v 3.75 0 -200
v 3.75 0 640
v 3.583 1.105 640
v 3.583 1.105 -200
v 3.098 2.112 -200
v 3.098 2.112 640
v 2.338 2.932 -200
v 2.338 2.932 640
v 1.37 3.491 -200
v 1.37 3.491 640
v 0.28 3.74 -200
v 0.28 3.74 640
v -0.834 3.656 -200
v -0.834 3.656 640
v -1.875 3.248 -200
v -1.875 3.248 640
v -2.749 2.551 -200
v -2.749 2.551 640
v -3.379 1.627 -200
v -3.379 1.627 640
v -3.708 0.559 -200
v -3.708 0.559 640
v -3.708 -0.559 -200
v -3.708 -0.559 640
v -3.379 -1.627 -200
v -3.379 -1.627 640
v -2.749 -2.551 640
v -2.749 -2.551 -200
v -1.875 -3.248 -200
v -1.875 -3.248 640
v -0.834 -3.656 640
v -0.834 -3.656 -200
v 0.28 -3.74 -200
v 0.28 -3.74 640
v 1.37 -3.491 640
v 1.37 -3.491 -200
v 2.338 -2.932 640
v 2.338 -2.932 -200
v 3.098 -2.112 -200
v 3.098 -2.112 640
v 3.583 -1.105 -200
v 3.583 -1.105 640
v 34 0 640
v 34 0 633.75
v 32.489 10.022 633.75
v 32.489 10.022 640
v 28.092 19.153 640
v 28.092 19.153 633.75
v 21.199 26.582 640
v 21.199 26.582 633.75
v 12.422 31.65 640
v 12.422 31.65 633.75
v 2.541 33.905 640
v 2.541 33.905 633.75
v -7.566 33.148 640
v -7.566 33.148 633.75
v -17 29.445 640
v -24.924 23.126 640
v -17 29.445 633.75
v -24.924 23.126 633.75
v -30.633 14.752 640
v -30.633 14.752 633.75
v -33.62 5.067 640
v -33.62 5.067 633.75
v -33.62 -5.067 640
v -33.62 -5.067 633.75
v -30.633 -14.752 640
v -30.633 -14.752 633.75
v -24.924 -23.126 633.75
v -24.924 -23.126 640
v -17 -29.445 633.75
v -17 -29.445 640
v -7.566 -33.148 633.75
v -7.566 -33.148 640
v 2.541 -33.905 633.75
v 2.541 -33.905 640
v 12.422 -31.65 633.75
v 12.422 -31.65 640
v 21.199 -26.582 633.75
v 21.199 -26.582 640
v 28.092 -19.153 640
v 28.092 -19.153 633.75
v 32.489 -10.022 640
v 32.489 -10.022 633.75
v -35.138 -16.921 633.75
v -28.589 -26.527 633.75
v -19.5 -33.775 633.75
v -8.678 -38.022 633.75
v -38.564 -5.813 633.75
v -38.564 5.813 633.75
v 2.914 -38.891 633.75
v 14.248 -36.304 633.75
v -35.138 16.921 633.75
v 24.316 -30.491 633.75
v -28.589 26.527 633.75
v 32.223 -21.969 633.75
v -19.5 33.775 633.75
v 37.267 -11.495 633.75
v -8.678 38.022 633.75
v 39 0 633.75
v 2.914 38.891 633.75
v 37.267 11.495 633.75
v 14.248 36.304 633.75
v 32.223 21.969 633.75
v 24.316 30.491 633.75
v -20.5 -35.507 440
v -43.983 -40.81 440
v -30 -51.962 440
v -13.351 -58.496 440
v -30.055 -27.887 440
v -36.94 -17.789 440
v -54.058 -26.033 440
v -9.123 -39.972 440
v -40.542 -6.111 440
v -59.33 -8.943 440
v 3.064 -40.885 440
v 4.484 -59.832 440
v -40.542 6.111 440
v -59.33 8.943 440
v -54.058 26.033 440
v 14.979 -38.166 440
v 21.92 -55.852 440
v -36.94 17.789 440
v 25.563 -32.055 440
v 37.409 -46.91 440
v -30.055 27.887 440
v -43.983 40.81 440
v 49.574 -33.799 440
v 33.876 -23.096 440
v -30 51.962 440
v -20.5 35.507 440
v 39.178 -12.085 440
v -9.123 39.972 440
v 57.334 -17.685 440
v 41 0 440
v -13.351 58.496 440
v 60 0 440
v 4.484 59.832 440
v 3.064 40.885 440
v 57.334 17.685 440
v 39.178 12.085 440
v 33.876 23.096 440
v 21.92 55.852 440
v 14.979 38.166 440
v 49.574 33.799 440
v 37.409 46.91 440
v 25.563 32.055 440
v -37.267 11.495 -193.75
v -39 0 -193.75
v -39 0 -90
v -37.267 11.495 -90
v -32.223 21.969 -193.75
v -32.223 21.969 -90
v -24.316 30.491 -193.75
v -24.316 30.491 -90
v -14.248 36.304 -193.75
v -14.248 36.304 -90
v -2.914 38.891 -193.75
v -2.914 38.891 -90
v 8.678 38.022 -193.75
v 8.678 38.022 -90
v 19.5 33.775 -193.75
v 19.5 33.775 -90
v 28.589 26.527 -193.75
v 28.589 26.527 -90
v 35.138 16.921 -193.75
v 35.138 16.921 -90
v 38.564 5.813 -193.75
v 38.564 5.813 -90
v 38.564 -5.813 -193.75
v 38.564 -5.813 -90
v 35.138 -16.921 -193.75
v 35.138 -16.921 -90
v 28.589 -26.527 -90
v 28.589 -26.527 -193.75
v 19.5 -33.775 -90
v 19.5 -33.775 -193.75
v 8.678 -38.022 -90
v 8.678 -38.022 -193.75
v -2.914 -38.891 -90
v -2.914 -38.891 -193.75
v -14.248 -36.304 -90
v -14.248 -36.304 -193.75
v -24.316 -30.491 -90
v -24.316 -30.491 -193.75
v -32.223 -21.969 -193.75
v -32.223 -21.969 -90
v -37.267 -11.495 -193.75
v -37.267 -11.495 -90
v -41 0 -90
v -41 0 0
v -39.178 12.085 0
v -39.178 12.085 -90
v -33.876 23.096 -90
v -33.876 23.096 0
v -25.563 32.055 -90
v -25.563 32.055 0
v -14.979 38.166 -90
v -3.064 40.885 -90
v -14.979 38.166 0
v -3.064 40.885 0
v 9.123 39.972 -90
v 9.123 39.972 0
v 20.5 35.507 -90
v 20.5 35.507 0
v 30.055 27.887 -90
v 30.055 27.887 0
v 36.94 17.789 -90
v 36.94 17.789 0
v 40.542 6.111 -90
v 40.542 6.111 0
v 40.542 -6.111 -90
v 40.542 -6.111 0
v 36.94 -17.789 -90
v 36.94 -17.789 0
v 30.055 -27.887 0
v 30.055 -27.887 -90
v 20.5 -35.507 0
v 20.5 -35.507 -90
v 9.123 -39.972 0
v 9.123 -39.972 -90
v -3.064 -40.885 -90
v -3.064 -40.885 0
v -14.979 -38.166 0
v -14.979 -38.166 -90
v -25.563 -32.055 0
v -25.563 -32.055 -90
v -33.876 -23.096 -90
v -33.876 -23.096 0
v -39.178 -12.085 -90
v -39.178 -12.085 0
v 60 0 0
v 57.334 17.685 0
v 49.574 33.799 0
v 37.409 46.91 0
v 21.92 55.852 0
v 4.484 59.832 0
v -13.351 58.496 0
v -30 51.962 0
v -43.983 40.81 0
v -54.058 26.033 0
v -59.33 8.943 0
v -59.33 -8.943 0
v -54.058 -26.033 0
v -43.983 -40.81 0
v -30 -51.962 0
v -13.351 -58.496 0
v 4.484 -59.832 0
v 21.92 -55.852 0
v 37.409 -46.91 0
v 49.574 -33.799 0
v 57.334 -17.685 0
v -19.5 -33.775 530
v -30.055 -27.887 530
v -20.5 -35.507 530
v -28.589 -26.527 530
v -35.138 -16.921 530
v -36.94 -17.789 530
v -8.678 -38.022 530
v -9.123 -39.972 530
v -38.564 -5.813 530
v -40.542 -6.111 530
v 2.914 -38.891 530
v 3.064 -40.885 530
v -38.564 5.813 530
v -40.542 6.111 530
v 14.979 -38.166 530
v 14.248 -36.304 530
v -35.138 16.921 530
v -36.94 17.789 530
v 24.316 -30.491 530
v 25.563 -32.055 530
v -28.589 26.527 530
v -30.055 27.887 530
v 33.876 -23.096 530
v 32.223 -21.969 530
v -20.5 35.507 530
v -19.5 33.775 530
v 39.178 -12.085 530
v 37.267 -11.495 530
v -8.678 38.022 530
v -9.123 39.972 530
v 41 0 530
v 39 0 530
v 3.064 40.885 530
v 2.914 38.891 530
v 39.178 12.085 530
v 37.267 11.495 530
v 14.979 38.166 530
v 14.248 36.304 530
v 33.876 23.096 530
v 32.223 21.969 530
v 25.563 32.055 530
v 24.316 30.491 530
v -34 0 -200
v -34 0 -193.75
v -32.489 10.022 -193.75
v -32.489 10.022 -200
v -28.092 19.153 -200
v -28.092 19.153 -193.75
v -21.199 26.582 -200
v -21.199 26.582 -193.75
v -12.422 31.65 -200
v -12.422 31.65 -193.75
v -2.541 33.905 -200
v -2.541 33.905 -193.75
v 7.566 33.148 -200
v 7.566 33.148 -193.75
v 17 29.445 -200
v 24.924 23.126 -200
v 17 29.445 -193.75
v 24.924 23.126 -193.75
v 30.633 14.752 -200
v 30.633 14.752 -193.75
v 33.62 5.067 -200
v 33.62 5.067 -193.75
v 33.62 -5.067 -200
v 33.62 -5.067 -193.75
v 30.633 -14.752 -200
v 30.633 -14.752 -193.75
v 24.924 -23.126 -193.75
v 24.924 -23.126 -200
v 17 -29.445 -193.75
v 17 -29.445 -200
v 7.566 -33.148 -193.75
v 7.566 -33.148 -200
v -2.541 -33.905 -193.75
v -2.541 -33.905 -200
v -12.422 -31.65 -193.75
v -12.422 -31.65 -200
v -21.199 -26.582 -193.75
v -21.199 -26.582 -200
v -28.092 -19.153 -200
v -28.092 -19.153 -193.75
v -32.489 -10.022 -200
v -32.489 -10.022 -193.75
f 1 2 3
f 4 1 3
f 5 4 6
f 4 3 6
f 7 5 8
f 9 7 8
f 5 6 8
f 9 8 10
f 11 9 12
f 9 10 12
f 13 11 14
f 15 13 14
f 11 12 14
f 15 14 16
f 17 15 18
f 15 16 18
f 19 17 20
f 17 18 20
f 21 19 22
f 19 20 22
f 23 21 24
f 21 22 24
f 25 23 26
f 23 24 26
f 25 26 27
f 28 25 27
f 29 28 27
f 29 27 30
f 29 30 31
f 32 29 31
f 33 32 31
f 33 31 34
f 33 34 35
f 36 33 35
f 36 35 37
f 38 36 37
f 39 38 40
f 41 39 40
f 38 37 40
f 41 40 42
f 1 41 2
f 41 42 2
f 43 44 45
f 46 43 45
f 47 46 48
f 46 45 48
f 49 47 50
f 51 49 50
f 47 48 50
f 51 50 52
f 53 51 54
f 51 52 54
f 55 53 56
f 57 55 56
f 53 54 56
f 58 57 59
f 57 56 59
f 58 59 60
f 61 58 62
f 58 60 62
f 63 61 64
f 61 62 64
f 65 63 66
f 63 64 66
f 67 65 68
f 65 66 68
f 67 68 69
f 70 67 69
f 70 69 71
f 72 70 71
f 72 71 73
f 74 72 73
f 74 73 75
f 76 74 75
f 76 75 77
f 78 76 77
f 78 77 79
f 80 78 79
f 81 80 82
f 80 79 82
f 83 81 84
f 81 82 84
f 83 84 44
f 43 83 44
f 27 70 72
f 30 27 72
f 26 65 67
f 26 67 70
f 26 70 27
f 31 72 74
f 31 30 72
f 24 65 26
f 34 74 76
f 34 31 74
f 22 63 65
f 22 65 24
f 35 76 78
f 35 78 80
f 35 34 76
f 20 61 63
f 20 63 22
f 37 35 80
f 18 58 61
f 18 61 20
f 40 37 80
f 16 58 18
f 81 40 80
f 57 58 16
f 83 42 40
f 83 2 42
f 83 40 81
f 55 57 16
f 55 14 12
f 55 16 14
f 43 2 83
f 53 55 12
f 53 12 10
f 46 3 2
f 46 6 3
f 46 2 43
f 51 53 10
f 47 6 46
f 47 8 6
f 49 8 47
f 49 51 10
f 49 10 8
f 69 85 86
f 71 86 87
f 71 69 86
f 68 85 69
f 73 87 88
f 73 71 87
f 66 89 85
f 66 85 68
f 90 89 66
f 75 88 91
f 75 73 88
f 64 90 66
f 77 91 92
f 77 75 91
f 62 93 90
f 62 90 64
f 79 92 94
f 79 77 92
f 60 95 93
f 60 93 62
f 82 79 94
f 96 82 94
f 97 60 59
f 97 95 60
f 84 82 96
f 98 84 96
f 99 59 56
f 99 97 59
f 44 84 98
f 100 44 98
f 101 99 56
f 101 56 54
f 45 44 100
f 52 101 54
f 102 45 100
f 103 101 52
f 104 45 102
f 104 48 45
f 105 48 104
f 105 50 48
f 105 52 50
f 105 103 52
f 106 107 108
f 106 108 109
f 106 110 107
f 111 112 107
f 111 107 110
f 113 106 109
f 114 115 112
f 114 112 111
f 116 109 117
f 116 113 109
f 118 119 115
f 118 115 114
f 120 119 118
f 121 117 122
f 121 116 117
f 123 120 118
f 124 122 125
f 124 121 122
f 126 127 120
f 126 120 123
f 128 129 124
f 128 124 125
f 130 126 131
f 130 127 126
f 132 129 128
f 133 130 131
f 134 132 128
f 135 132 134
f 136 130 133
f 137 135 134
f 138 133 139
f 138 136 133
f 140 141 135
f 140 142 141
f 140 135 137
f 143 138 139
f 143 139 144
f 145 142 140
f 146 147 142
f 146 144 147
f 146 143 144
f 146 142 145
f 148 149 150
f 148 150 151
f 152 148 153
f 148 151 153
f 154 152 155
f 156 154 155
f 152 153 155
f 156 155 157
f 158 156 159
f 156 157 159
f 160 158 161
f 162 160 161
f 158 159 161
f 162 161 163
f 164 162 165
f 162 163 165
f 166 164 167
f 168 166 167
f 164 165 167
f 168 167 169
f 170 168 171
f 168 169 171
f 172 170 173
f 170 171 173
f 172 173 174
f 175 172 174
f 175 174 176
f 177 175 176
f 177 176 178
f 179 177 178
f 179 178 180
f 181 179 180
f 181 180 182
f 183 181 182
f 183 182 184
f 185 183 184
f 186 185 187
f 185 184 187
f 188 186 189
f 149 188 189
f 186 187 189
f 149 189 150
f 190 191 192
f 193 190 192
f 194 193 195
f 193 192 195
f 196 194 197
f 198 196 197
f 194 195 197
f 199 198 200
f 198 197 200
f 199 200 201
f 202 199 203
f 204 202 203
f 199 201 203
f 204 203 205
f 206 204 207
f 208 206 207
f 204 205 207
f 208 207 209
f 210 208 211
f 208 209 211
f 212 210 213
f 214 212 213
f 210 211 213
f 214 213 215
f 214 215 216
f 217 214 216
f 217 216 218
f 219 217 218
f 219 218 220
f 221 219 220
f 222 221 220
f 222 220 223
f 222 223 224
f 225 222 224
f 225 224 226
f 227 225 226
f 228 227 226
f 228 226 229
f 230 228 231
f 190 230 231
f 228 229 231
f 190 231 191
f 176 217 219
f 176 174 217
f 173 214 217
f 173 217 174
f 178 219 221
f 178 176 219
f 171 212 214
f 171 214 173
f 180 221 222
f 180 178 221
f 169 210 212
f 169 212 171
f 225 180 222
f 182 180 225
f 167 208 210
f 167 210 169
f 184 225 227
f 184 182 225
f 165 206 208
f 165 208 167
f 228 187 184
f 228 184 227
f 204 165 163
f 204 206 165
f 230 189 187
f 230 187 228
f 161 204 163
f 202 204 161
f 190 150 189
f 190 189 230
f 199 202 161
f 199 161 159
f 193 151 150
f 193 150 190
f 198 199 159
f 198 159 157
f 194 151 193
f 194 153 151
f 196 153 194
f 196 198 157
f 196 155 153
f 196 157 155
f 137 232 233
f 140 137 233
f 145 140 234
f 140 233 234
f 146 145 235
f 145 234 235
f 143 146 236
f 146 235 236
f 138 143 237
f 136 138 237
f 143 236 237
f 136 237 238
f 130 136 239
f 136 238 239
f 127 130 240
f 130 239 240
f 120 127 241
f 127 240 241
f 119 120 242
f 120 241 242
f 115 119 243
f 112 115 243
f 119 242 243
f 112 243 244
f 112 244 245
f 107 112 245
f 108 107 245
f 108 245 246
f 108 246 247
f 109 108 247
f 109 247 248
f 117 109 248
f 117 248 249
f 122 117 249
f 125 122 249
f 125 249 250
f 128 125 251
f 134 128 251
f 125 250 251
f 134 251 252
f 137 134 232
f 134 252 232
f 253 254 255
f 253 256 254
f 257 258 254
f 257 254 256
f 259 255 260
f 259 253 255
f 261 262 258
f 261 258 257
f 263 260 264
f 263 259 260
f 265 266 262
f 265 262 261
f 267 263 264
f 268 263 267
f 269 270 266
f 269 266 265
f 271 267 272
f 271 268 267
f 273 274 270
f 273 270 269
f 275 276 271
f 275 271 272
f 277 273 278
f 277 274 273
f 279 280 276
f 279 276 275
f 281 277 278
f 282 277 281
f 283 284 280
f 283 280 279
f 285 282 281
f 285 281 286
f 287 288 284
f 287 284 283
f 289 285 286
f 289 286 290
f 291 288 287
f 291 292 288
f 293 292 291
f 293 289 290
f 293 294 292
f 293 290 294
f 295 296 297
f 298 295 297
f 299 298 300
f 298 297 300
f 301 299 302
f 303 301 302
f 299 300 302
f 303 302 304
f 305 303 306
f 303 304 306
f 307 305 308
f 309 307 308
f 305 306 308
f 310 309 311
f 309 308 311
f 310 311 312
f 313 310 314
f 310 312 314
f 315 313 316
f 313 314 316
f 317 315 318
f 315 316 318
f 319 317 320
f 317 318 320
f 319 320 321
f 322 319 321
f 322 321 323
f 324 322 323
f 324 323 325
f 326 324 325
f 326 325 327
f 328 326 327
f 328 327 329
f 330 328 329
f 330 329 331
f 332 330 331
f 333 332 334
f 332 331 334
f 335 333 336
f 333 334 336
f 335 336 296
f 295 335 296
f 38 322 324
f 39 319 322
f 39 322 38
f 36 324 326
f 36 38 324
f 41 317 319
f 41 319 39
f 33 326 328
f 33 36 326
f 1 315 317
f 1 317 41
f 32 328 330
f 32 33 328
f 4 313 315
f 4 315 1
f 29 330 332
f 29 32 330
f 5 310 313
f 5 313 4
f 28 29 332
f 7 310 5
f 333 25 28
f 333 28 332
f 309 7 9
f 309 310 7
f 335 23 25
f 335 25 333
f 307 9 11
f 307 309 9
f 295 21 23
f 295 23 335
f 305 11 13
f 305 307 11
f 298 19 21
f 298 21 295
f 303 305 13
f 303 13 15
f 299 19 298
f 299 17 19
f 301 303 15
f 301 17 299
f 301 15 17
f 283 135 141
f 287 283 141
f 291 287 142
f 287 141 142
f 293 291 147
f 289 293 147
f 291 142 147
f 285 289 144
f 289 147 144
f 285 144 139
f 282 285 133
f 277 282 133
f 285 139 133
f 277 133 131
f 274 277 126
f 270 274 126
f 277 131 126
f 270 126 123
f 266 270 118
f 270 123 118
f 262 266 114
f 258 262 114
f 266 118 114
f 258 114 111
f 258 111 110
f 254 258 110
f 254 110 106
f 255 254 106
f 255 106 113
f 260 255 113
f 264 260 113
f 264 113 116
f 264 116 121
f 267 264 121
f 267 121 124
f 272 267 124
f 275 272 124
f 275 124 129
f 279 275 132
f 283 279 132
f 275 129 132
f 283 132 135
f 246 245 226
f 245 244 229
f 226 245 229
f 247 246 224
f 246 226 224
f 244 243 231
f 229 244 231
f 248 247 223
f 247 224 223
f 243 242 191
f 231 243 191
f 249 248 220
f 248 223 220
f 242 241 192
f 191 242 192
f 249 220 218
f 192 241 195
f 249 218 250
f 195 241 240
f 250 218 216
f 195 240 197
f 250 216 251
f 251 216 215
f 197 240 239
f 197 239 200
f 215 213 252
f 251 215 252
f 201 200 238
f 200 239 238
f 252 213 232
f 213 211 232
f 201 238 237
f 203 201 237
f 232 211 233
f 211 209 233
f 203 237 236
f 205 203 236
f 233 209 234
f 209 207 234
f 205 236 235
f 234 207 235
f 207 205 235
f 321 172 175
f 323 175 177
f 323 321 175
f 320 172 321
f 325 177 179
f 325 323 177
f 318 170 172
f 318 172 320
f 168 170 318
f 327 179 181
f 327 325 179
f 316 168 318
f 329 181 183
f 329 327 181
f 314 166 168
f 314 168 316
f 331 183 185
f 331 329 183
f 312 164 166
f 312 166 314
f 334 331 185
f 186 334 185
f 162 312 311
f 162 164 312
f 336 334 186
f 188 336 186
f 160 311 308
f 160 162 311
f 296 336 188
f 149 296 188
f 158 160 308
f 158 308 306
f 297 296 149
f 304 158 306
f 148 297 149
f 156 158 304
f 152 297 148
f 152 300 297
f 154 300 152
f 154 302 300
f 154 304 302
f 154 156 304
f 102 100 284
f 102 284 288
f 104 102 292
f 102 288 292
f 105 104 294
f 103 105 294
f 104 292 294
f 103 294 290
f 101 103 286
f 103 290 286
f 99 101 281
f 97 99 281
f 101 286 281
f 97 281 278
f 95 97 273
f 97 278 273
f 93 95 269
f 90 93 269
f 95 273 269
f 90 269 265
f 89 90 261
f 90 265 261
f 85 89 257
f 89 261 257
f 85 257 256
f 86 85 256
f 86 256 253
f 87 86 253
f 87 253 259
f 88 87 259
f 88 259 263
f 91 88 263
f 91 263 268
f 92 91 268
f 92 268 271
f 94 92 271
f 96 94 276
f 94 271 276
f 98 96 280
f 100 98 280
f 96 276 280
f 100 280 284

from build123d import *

# Parameters (mm, degrees)
SKETCH1_R           = 60
BOSS_EXTRUDE1_DEPTH = 440
SKETCH2_R           = 41
BOSS_EXTRUDE2_DEPTH = 90
SKETCH3_R           = 41
BOSS_EXTRUDE3_DEPTH = 90
SKETCH4_R           = 39
BOSS_EXTRUDE4_DEPTH = 103.75
SKETCH5_R           = 39
BOSS_EXTRUDE5_DEPTH = 103.75
SKETCH6_R           = 34
BOSS_EXTRUDE6_DEPTH = 6.25
SKETCH7_R           = 34
BOSS_EXTRUDE7_DEPTH = 6.25
SKETCH8_R           = 3.75
CUT_EXTRUDE1_DEPTH  = 840


with BuildPart() as part:
    # Sketch1 → Boss-Extrude1 (new body)
    with BuildSketch(Plane.XY):
        Circle(SKETCH1_R)
    extrude(amount=BOSS_EXTRUDE1_DEPTH)

    # Sketch2 → Boss-Extrude2 (add)
    with BuildSketch(Plane(origin=(0, 0, 0), x_dir=(-1, 0, 0), z_dir=(0, 0, -1))):
        Circle(SKETCH2_R)
    extrude(amount=BOSS_EXTRUDE2_DEPTH)

    # Sketch3 → Boss-Extrude3 (add)
    with BuildSketch(Plane.XY.offset(440)):
        Circle(SKETCH3_R)
    extrude(amount=BOSS_EXTRUDE3_DEPTH)

    # Sketch4 → Boss-Extrude4 (add)
    with BuildSketch(Plane.XY.offset(530)):
        Circle(SKETCH4_R)
    extrude(amount=BOSS_EXTRUDE4_DEPTH)

    # Sketch5 → Boss-Extrude5 (add)
    with BuildSketch(Plane(origin=(0, 0, -90), x_dir=(-1, 0, 0), z_dir=(0, 0, -1))):
        Circle(SKETCH5_R)
    extrude(amount=BOSS_EXTRUDE5_DEPTH)

    # Sketch6 → Boss-Extrude6 (add)
    with BuildSketch(Plane(origin=(0, 0, -193.75), x_dir=(-1, 0, 0), z_dir=(0, 0, -1))):
        Circle(SKETCH6_R)
    extrude(amount=BOSS_EXTRUDE6_DEPTH)

    # Sketch7 → Boss-Extrude7 (add)
    with BuildSketch(Plane.XY.offset(633.75)):
        Circle(SKETCH7_R)
    extrude(amount=BOSS_EXTRUDE7_DEPTH)

    # Sketch8 → Cut-Extrude1 (cut)
    with BuildSketch(Plane.XY.offset(640)):
        Circle(SKETCH8_R)
    extrude(amount=-CUT_EXTRUDE1_DEPTH, mode=Mode.SUBTRACT)


solid = part.part
